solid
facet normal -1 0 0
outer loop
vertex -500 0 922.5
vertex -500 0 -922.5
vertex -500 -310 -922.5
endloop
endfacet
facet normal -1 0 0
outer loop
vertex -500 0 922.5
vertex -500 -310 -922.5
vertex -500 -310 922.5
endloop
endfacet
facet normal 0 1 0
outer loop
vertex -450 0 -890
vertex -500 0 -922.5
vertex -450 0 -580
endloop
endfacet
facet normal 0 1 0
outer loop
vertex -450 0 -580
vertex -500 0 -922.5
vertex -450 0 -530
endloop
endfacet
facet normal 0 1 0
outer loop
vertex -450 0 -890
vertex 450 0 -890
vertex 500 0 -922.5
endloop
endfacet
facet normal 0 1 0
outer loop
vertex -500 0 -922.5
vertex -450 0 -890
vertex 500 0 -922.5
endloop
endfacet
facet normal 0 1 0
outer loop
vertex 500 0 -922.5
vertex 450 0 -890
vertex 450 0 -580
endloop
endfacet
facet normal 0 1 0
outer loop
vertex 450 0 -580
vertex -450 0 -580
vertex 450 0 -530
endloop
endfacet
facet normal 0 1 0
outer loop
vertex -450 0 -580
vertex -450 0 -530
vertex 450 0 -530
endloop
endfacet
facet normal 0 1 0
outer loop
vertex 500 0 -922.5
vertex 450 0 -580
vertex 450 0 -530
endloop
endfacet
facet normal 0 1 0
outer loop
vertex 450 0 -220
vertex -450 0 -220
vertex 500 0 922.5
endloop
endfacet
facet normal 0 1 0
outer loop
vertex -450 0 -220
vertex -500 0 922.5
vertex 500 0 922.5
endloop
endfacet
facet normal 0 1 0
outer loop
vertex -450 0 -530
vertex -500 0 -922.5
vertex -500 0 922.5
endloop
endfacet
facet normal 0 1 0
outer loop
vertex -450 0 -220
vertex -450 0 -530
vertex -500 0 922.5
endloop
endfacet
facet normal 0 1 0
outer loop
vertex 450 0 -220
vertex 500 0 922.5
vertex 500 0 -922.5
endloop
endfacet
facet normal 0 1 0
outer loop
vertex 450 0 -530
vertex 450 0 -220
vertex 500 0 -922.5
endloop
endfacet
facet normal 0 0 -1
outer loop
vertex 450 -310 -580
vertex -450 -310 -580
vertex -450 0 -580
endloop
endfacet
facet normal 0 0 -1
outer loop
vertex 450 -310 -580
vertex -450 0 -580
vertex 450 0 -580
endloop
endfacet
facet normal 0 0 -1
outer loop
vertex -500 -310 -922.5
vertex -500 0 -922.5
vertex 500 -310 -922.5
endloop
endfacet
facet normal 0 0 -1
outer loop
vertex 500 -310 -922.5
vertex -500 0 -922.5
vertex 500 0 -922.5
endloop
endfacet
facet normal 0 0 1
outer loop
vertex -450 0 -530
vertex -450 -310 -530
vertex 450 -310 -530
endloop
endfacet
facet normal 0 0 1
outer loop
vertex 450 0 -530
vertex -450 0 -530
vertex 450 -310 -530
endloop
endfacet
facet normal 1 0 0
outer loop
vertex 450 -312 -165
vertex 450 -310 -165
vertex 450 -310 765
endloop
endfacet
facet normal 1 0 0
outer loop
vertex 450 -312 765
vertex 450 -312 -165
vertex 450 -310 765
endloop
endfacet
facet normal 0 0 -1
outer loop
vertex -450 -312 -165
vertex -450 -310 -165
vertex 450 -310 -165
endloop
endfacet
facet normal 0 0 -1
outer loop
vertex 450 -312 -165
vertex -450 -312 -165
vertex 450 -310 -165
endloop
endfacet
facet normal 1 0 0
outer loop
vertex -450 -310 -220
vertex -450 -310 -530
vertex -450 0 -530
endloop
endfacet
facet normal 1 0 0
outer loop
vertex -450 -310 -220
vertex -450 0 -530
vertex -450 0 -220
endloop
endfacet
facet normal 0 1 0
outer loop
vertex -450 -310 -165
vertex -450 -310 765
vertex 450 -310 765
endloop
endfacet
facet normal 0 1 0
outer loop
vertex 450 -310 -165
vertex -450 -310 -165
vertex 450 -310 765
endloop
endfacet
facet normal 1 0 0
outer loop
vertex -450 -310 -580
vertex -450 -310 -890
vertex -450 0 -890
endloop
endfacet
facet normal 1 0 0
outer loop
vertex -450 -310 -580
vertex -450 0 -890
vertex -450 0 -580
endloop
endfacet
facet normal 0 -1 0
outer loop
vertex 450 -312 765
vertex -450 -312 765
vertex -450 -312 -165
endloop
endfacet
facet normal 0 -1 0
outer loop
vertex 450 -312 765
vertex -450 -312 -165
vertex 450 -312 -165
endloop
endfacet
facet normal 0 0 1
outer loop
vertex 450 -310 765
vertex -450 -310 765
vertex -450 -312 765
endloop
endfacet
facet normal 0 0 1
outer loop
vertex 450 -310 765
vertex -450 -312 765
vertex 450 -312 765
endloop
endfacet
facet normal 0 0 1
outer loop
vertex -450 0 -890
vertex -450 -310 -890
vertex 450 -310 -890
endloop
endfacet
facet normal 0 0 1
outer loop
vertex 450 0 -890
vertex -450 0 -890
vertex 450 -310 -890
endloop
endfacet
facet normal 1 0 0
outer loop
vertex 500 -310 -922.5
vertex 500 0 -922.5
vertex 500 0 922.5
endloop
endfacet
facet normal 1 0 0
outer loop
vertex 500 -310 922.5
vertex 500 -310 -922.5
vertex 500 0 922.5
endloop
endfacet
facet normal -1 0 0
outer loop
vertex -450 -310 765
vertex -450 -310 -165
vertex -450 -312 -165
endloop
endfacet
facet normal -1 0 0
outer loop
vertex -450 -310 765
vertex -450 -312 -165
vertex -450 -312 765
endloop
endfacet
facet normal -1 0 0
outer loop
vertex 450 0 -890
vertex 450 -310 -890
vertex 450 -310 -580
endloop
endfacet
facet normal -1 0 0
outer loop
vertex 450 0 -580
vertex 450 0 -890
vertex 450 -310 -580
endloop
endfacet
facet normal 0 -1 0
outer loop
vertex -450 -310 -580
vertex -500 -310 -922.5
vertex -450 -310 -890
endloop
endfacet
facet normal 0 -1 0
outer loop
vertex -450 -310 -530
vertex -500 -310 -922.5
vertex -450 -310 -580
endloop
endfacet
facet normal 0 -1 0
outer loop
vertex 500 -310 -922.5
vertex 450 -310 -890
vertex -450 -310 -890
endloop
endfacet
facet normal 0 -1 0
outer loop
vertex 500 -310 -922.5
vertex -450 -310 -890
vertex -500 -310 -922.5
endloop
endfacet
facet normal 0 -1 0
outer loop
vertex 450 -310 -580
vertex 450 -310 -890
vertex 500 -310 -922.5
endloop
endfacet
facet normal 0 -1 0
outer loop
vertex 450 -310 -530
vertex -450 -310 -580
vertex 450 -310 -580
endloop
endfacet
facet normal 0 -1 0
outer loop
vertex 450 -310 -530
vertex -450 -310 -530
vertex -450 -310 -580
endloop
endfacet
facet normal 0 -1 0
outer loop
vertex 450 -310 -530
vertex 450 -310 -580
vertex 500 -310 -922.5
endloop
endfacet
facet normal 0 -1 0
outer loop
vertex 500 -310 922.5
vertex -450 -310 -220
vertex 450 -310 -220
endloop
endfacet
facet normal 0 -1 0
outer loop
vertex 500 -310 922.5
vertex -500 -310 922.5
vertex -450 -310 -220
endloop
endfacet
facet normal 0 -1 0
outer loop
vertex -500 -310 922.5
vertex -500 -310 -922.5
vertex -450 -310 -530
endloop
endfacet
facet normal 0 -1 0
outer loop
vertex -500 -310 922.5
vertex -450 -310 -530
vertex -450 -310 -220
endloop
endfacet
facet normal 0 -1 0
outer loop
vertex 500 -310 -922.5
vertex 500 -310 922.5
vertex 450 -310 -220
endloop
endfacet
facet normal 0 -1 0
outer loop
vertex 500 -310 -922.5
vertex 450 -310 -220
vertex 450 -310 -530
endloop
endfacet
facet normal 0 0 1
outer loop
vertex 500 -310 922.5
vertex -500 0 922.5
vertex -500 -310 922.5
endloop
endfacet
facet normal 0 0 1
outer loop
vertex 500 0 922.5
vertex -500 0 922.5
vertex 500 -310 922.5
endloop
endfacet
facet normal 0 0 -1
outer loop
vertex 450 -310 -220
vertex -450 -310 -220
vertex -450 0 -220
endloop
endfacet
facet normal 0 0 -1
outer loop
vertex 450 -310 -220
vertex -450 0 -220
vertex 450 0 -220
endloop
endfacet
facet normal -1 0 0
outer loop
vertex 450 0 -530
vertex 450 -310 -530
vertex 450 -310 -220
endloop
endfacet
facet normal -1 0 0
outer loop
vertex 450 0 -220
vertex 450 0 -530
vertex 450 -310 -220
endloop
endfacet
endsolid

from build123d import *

# Parameters (mm, degrees)
F0_W     = 1000
F0_H     = 1845
F1_DEPTH = 310
F4_W     = 900
F4_H     = 930
F2_DEPTH = 2
F5_W     = 900
F5_H     = 310
F3_DEPTH = 310.001


with BuildPart() as f1:
    # F0 (on Front) → F1 (new body)
    with BuildSketch(Plane.XZ):
        Rectangle(F0_W, F0_H)
    extrude(amount=F1_DEPTH)

    # F5 (on face) → F3 (cut, through all)
    with BuildSketch(Plane.XZ.offset(310)):
        with Locations((0, -375)):
            Rectangle(F5_W, F5_H)
        with Locations((0, -735)):
            Rectangle(F5_W, F5_H)
    extrude(amount=-F3_DEPTH, mode=Mode.SUBTRACT)


with BuildPart() as f2:
    # F4 (on face) → F2 (new body)
    with BuildSketch(Plane.XZ.offset(310)):
        with Locations((0, 300)):
            Rectangle(F4_W, F4_H)
    extrude(amount=F2_DEPTH)


solid = Compound([f1.part, f2.part])
